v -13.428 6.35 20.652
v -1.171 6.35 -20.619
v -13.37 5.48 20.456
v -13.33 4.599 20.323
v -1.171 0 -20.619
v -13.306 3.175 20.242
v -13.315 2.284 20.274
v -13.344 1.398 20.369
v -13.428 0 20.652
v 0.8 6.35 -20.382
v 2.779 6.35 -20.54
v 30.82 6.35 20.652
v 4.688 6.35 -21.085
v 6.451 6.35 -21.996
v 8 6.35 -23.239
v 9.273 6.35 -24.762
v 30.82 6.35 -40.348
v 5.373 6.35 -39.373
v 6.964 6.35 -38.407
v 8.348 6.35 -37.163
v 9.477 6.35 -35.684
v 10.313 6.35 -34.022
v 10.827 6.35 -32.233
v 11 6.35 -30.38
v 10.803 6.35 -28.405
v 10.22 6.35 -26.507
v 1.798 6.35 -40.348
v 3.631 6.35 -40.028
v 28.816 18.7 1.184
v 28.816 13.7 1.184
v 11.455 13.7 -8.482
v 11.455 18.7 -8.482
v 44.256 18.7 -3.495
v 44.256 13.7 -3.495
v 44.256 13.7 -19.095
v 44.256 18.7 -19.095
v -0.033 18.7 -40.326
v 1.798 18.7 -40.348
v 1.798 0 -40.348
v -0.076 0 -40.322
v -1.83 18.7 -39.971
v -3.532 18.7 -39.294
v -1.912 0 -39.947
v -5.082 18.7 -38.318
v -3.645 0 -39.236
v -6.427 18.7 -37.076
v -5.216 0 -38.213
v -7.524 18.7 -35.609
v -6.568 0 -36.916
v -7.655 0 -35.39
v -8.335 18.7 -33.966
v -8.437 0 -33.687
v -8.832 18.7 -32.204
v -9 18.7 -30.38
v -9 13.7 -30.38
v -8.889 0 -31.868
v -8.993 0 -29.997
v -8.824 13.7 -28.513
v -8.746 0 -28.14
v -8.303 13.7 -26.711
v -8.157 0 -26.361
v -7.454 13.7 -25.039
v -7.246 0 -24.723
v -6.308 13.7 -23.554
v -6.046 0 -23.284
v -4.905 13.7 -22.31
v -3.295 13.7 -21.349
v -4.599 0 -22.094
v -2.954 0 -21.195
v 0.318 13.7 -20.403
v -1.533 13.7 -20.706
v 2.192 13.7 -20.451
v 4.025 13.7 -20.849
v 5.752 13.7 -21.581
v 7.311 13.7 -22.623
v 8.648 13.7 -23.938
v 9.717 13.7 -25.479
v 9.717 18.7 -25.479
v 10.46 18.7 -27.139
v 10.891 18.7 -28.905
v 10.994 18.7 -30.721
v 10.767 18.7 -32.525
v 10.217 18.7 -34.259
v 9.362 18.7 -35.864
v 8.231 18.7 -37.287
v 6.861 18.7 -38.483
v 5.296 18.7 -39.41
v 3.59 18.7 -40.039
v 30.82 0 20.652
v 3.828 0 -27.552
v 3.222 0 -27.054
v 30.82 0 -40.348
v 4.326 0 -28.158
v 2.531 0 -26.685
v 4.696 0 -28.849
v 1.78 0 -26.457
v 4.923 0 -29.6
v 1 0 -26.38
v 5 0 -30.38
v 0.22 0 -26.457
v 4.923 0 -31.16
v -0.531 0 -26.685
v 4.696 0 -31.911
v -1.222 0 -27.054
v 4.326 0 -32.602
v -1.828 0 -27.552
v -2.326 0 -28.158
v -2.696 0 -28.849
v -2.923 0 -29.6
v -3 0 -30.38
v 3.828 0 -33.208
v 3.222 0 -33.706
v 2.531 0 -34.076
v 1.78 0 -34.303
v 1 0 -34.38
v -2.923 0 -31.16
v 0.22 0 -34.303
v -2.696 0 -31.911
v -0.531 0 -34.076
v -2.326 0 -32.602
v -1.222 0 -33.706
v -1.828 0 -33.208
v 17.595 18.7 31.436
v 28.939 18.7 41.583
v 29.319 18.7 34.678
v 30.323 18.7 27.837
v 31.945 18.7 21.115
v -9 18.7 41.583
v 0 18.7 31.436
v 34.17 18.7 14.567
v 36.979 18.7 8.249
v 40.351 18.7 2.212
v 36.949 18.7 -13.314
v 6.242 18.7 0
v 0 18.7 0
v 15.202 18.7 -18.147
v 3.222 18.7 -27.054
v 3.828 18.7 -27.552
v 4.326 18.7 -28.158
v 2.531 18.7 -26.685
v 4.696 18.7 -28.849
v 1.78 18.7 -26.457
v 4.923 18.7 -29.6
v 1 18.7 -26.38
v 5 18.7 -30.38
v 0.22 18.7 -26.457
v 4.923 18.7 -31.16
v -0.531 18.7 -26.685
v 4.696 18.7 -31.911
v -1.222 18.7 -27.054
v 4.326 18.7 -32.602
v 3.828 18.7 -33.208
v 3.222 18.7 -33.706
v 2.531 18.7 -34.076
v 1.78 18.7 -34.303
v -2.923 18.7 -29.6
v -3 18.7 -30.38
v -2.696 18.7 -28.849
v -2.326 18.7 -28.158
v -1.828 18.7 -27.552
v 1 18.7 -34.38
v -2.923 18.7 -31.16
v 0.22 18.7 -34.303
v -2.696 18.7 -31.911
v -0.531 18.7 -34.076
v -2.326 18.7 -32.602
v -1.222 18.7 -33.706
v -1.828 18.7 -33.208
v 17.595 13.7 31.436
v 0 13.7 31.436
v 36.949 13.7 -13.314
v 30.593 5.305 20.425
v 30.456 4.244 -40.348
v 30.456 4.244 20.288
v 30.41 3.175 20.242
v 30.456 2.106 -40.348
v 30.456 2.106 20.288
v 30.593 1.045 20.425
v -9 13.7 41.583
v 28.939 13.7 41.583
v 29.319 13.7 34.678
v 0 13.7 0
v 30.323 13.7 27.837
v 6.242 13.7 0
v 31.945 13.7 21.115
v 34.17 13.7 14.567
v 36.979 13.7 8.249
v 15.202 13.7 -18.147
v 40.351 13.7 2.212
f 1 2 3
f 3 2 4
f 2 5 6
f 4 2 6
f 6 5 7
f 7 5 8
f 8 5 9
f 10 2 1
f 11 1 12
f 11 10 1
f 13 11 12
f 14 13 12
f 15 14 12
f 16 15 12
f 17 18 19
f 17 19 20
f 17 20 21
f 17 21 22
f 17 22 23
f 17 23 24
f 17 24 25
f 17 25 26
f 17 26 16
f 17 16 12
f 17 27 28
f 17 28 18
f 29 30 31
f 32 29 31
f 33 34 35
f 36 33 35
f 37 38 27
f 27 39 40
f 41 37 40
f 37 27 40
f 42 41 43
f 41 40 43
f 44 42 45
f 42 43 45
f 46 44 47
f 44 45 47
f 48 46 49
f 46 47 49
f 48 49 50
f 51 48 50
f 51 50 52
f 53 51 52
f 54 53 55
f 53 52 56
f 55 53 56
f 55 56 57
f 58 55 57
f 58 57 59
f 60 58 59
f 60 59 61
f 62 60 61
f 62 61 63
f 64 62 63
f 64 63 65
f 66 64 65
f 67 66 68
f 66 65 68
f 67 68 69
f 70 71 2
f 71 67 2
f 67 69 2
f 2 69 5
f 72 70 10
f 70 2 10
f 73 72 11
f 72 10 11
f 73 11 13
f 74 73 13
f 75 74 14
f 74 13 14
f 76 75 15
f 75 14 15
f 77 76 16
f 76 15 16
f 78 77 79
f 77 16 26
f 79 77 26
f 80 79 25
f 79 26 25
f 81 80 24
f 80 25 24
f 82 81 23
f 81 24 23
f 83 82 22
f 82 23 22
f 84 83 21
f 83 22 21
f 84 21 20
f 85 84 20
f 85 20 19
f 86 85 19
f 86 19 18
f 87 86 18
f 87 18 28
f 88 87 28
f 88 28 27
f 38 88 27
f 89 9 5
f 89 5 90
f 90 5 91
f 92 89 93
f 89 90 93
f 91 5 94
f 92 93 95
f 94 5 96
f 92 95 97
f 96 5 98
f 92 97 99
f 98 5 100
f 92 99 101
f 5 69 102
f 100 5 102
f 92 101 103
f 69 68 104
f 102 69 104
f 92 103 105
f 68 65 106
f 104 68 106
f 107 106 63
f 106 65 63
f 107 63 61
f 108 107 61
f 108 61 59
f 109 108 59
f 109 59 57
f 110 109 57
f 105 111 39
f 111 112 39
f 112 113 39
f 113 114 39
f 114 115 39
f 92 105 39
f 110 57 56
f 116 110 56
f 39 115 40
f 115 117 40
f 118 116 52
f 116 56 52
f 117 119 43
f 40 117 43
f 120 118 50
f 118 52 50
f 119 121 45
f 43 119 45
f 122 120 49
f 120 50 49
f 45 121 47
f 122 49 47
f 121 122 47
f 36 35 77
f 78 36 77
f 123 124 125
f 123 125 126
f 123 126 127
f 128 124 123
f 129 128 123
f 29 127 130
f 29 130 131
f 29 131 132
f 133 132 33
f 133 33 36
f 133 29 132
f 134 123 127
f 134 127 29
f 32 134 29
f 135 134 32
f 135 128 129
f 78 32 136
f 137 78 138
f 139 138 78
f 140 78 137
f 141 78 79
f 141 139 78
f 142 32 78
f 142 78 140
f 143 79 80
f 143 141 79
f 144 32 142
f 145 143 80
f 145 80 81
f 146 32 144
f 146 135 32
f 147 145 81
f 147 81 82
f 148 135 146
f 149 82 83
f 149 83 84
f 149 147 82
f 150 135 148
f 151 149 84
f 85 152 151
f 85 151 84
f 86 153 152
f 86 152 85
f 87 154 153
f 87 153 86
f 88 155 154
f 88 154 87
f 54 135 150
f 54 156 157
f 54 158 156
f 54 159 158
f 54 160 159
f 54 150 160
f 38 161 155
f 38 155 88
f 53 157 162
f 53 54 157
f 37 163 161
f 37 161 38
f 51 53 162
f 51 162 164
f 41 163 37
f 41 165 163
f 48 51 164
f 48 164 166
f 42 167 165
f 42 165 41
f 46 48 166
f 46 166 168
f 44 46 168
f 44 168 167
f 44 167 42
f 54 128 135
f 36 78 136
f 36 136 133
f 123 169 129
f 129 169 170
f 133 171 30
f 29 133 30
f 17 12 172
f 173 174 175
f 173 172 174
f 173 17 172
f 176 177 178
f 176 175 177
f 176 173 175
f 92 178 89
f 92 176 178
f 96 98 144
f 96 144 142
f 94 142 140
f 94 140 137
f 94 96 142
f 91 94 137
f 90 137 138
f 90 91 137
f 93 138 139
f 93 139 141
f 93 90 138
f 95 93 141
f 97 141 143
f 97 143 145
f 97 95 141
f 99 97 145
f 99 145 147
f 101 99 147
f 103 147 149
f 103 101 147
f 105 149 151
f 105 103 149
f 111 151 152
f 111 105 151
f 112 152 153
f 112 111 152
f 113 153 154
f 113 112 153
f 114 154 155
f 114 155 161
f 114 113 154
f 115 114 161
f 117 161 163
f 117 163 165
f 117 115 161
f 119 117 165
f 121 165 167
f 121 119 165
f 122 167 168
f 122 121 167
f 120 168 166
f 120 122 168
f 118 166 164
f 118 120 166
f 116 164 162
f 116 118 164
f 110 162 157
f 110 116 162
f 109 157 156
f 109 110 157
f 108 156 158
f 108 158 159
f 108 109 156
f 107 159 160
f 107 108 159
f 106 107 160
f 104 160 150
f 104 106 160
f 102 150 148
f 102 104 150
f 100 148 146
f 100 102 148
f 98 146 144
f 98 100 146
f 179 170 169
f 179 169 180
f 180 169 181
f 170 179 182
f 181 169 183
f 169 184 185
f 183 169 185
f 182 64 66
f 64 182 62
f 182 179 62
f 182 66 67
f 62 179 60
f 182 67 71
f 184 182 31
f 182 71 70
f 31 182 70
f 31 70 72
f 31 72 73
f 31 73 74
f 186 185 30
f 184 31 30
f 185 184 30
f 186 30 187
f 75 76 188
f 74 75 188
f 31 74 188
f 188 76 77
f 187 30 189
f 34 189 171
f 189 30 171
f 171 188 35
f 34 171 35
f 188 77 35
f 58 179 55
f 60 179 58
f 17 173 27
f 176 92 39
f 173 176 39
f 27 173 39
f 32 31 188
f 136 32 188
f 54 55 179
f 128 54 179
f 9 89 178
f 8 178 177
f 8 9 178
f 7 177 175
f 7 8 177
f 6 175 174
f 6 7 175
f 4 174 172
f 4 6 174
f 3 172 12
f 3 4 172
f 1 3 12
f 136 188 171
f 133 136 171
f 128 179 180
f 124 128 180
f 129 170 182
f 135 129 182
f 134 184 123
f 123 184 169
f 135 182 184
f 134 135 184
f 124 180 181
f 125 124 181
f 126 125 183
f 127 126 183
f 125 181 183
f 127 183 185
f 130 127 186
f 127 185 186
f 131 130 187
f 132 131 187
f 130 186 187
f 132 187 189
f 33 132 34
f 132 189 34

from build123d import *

# Parameters (mm, degrees)
BOSS_EXTRUDE1_DEPTH     = 6.35
SKETCH1_3_R             = 4
BOSS_EXTRUDE2_DEPTH     = 18.7
CUT_EXTRUDE1_DEPTH      = 55.130565784
CUT_EXTRUDE1_DEPTH_BACK = 55.130565784
SKETCH3_R               = 12.5
CUT_EXTRUDE3_DEPTH      = 55.130565784
CUT_EXTRUDE3_DEPTH_BACK = 55.130565784
SKETCH4_R               = 12.5
BOSS_EXTRUDE3_START     = -5
BOSS_EXTRUDE3_DEPTH     = 5


with BuildPart() as part:
    # Sketch1 → Boss-Extrude1 (new body)
    with BuildSketch(Plane(origin=(0, 0, 0), x_dir=(1, 0, 0), z_dir=(0, 1, 0))):
        with BuildLine():
            Line((30.820134884, -20.651845529), (30.820134884, 40.348154471))
            Line((30.820134884, 40.348154471), (1.797901548, 40.348154471))
            ThreePointArc((1.797901548, 40.348154471), (8.347755505, 37.163141176), (11.000000332, 30.380037615))
            ThreePointArc((11.000000332, 30.380037615), (7.256441333, 22.578951408), (-1.171388868, 20.618630496))
            Line((-1.171388868, 20.618630496), (-13.427648664, -20.651845529))
            Line((-13.427648664, -20.651845529), (30.820134884, -20.651845529))
        make_face()
    extrude(amount=BOSS_EXTRUDE1_DEPTH)

    # Sketch1<3> → Boss-Extrude2 (add)
    with BuildSketch(Plane(origin=(0, 0, 0), x_dir=(1, 0, 0), z_dir=(0, 1, 0))):
        with BuildLine():
            ThreePointArc((11.000000332, 30.380037615), (8.347755505, 37.163141176), (1.797901548, 40.348154471))
            ThreePointArc((1.797901548, 40.348154471), (-8.888636903, 31.868276044), (-1.171388868, 20.618630496))
            ThreePointArc((-1.171388868, 20.618630496), (7.256441333, 22.578951408), (11.000000332, 30.380037615))
        make_face()
        with Locations((1.000000332, 30.380037615)):
            Circle(SKETCH1_3_R, mode=Mode.SUBTRACT)
    extrude(amount=BOSS_EXTRUDE2_DEPTH)

    # Sketch3 → Cut-Extrude1 (cut, two sides: drawn at the far end of the back side and taken through both)
    with BuildSketch(Plane.XY.offset(-CUT_EXTRUDE1_DEPTH_BACK)):
        with Locations((42.910187614, 3.175)):
            Circle(SKETCH3_R)
    extrude(amount=CUT_EXTRUDE1_DEPTH + CUT_EXTRUDE1_DEPTH_BACK, mode=Mode.SUBTRACT)

    # Sketch4 → Cut-Extrude3 (cut, two sides: drawn at the far end of the back side and taken through both)
    with BuildSketch(Plane(origin=(0, 0, 0), x_dir=(0, 0, -1), z_dir=(1, 0, 0)).offset(-CUT_EXTRUDE3_DEPTH_BACK)):
        with Locations((-32.741898259, 3.175)):
            Circle(SKETCH4_R)
    extrude(amount=CUT_EXTRUDE3_DEPTH + CUT_EXTRUDE3_DEPTH_BACK, mode=Mode.SUBTRACT)

    # Sketch5 → Boss-Extrude3 (add)
    with BuildSketch(Plane(origin=(0, 18.7, 0), x_dir=(1, 0, 0), z_dir=(0, 1, 0)).offset(BOSS_EXTRUDE3_START)):
        with BuildLine():
            ThreePointArc((9.716620703, 25.478963312), (-1.533159384, 20.706201672), (-8.999999668, 30.380037615))
            Line((-8.999999668, 30.380037615), (-8.999999668, -41.582926526))
            Line((-8.999999668, -41.582926526), (28.938924754, -41.582926526))
            ThreePointArc((28.938924754, -41.582926526), (32.982787431, -17.815786501), (44.256083353, 3.494834546))
            Line((44.256083353, 3.494834546), (44.256083353, 19.094758402))
            Line((44.256083353, 19.094758402), (9.716620703, 25.478963312))
        make_face()
        Polygon((17.594978634, -31.436293162), (0, -31.436293162), (0, 0), (6.242345966, 0), align=None, mode=Mode.SUBTRACT)
        Polygon((28.816009284, -1.183711765), (11.455147871, 8.481691767), (15.20184924, 18.147095298), (36.949007186, 13.314393532), align=None, mode=Mode.SUBTRACT)
    extrude(amount=BOSS_EXTRUDE3_DEPTH)


solid = part.part
